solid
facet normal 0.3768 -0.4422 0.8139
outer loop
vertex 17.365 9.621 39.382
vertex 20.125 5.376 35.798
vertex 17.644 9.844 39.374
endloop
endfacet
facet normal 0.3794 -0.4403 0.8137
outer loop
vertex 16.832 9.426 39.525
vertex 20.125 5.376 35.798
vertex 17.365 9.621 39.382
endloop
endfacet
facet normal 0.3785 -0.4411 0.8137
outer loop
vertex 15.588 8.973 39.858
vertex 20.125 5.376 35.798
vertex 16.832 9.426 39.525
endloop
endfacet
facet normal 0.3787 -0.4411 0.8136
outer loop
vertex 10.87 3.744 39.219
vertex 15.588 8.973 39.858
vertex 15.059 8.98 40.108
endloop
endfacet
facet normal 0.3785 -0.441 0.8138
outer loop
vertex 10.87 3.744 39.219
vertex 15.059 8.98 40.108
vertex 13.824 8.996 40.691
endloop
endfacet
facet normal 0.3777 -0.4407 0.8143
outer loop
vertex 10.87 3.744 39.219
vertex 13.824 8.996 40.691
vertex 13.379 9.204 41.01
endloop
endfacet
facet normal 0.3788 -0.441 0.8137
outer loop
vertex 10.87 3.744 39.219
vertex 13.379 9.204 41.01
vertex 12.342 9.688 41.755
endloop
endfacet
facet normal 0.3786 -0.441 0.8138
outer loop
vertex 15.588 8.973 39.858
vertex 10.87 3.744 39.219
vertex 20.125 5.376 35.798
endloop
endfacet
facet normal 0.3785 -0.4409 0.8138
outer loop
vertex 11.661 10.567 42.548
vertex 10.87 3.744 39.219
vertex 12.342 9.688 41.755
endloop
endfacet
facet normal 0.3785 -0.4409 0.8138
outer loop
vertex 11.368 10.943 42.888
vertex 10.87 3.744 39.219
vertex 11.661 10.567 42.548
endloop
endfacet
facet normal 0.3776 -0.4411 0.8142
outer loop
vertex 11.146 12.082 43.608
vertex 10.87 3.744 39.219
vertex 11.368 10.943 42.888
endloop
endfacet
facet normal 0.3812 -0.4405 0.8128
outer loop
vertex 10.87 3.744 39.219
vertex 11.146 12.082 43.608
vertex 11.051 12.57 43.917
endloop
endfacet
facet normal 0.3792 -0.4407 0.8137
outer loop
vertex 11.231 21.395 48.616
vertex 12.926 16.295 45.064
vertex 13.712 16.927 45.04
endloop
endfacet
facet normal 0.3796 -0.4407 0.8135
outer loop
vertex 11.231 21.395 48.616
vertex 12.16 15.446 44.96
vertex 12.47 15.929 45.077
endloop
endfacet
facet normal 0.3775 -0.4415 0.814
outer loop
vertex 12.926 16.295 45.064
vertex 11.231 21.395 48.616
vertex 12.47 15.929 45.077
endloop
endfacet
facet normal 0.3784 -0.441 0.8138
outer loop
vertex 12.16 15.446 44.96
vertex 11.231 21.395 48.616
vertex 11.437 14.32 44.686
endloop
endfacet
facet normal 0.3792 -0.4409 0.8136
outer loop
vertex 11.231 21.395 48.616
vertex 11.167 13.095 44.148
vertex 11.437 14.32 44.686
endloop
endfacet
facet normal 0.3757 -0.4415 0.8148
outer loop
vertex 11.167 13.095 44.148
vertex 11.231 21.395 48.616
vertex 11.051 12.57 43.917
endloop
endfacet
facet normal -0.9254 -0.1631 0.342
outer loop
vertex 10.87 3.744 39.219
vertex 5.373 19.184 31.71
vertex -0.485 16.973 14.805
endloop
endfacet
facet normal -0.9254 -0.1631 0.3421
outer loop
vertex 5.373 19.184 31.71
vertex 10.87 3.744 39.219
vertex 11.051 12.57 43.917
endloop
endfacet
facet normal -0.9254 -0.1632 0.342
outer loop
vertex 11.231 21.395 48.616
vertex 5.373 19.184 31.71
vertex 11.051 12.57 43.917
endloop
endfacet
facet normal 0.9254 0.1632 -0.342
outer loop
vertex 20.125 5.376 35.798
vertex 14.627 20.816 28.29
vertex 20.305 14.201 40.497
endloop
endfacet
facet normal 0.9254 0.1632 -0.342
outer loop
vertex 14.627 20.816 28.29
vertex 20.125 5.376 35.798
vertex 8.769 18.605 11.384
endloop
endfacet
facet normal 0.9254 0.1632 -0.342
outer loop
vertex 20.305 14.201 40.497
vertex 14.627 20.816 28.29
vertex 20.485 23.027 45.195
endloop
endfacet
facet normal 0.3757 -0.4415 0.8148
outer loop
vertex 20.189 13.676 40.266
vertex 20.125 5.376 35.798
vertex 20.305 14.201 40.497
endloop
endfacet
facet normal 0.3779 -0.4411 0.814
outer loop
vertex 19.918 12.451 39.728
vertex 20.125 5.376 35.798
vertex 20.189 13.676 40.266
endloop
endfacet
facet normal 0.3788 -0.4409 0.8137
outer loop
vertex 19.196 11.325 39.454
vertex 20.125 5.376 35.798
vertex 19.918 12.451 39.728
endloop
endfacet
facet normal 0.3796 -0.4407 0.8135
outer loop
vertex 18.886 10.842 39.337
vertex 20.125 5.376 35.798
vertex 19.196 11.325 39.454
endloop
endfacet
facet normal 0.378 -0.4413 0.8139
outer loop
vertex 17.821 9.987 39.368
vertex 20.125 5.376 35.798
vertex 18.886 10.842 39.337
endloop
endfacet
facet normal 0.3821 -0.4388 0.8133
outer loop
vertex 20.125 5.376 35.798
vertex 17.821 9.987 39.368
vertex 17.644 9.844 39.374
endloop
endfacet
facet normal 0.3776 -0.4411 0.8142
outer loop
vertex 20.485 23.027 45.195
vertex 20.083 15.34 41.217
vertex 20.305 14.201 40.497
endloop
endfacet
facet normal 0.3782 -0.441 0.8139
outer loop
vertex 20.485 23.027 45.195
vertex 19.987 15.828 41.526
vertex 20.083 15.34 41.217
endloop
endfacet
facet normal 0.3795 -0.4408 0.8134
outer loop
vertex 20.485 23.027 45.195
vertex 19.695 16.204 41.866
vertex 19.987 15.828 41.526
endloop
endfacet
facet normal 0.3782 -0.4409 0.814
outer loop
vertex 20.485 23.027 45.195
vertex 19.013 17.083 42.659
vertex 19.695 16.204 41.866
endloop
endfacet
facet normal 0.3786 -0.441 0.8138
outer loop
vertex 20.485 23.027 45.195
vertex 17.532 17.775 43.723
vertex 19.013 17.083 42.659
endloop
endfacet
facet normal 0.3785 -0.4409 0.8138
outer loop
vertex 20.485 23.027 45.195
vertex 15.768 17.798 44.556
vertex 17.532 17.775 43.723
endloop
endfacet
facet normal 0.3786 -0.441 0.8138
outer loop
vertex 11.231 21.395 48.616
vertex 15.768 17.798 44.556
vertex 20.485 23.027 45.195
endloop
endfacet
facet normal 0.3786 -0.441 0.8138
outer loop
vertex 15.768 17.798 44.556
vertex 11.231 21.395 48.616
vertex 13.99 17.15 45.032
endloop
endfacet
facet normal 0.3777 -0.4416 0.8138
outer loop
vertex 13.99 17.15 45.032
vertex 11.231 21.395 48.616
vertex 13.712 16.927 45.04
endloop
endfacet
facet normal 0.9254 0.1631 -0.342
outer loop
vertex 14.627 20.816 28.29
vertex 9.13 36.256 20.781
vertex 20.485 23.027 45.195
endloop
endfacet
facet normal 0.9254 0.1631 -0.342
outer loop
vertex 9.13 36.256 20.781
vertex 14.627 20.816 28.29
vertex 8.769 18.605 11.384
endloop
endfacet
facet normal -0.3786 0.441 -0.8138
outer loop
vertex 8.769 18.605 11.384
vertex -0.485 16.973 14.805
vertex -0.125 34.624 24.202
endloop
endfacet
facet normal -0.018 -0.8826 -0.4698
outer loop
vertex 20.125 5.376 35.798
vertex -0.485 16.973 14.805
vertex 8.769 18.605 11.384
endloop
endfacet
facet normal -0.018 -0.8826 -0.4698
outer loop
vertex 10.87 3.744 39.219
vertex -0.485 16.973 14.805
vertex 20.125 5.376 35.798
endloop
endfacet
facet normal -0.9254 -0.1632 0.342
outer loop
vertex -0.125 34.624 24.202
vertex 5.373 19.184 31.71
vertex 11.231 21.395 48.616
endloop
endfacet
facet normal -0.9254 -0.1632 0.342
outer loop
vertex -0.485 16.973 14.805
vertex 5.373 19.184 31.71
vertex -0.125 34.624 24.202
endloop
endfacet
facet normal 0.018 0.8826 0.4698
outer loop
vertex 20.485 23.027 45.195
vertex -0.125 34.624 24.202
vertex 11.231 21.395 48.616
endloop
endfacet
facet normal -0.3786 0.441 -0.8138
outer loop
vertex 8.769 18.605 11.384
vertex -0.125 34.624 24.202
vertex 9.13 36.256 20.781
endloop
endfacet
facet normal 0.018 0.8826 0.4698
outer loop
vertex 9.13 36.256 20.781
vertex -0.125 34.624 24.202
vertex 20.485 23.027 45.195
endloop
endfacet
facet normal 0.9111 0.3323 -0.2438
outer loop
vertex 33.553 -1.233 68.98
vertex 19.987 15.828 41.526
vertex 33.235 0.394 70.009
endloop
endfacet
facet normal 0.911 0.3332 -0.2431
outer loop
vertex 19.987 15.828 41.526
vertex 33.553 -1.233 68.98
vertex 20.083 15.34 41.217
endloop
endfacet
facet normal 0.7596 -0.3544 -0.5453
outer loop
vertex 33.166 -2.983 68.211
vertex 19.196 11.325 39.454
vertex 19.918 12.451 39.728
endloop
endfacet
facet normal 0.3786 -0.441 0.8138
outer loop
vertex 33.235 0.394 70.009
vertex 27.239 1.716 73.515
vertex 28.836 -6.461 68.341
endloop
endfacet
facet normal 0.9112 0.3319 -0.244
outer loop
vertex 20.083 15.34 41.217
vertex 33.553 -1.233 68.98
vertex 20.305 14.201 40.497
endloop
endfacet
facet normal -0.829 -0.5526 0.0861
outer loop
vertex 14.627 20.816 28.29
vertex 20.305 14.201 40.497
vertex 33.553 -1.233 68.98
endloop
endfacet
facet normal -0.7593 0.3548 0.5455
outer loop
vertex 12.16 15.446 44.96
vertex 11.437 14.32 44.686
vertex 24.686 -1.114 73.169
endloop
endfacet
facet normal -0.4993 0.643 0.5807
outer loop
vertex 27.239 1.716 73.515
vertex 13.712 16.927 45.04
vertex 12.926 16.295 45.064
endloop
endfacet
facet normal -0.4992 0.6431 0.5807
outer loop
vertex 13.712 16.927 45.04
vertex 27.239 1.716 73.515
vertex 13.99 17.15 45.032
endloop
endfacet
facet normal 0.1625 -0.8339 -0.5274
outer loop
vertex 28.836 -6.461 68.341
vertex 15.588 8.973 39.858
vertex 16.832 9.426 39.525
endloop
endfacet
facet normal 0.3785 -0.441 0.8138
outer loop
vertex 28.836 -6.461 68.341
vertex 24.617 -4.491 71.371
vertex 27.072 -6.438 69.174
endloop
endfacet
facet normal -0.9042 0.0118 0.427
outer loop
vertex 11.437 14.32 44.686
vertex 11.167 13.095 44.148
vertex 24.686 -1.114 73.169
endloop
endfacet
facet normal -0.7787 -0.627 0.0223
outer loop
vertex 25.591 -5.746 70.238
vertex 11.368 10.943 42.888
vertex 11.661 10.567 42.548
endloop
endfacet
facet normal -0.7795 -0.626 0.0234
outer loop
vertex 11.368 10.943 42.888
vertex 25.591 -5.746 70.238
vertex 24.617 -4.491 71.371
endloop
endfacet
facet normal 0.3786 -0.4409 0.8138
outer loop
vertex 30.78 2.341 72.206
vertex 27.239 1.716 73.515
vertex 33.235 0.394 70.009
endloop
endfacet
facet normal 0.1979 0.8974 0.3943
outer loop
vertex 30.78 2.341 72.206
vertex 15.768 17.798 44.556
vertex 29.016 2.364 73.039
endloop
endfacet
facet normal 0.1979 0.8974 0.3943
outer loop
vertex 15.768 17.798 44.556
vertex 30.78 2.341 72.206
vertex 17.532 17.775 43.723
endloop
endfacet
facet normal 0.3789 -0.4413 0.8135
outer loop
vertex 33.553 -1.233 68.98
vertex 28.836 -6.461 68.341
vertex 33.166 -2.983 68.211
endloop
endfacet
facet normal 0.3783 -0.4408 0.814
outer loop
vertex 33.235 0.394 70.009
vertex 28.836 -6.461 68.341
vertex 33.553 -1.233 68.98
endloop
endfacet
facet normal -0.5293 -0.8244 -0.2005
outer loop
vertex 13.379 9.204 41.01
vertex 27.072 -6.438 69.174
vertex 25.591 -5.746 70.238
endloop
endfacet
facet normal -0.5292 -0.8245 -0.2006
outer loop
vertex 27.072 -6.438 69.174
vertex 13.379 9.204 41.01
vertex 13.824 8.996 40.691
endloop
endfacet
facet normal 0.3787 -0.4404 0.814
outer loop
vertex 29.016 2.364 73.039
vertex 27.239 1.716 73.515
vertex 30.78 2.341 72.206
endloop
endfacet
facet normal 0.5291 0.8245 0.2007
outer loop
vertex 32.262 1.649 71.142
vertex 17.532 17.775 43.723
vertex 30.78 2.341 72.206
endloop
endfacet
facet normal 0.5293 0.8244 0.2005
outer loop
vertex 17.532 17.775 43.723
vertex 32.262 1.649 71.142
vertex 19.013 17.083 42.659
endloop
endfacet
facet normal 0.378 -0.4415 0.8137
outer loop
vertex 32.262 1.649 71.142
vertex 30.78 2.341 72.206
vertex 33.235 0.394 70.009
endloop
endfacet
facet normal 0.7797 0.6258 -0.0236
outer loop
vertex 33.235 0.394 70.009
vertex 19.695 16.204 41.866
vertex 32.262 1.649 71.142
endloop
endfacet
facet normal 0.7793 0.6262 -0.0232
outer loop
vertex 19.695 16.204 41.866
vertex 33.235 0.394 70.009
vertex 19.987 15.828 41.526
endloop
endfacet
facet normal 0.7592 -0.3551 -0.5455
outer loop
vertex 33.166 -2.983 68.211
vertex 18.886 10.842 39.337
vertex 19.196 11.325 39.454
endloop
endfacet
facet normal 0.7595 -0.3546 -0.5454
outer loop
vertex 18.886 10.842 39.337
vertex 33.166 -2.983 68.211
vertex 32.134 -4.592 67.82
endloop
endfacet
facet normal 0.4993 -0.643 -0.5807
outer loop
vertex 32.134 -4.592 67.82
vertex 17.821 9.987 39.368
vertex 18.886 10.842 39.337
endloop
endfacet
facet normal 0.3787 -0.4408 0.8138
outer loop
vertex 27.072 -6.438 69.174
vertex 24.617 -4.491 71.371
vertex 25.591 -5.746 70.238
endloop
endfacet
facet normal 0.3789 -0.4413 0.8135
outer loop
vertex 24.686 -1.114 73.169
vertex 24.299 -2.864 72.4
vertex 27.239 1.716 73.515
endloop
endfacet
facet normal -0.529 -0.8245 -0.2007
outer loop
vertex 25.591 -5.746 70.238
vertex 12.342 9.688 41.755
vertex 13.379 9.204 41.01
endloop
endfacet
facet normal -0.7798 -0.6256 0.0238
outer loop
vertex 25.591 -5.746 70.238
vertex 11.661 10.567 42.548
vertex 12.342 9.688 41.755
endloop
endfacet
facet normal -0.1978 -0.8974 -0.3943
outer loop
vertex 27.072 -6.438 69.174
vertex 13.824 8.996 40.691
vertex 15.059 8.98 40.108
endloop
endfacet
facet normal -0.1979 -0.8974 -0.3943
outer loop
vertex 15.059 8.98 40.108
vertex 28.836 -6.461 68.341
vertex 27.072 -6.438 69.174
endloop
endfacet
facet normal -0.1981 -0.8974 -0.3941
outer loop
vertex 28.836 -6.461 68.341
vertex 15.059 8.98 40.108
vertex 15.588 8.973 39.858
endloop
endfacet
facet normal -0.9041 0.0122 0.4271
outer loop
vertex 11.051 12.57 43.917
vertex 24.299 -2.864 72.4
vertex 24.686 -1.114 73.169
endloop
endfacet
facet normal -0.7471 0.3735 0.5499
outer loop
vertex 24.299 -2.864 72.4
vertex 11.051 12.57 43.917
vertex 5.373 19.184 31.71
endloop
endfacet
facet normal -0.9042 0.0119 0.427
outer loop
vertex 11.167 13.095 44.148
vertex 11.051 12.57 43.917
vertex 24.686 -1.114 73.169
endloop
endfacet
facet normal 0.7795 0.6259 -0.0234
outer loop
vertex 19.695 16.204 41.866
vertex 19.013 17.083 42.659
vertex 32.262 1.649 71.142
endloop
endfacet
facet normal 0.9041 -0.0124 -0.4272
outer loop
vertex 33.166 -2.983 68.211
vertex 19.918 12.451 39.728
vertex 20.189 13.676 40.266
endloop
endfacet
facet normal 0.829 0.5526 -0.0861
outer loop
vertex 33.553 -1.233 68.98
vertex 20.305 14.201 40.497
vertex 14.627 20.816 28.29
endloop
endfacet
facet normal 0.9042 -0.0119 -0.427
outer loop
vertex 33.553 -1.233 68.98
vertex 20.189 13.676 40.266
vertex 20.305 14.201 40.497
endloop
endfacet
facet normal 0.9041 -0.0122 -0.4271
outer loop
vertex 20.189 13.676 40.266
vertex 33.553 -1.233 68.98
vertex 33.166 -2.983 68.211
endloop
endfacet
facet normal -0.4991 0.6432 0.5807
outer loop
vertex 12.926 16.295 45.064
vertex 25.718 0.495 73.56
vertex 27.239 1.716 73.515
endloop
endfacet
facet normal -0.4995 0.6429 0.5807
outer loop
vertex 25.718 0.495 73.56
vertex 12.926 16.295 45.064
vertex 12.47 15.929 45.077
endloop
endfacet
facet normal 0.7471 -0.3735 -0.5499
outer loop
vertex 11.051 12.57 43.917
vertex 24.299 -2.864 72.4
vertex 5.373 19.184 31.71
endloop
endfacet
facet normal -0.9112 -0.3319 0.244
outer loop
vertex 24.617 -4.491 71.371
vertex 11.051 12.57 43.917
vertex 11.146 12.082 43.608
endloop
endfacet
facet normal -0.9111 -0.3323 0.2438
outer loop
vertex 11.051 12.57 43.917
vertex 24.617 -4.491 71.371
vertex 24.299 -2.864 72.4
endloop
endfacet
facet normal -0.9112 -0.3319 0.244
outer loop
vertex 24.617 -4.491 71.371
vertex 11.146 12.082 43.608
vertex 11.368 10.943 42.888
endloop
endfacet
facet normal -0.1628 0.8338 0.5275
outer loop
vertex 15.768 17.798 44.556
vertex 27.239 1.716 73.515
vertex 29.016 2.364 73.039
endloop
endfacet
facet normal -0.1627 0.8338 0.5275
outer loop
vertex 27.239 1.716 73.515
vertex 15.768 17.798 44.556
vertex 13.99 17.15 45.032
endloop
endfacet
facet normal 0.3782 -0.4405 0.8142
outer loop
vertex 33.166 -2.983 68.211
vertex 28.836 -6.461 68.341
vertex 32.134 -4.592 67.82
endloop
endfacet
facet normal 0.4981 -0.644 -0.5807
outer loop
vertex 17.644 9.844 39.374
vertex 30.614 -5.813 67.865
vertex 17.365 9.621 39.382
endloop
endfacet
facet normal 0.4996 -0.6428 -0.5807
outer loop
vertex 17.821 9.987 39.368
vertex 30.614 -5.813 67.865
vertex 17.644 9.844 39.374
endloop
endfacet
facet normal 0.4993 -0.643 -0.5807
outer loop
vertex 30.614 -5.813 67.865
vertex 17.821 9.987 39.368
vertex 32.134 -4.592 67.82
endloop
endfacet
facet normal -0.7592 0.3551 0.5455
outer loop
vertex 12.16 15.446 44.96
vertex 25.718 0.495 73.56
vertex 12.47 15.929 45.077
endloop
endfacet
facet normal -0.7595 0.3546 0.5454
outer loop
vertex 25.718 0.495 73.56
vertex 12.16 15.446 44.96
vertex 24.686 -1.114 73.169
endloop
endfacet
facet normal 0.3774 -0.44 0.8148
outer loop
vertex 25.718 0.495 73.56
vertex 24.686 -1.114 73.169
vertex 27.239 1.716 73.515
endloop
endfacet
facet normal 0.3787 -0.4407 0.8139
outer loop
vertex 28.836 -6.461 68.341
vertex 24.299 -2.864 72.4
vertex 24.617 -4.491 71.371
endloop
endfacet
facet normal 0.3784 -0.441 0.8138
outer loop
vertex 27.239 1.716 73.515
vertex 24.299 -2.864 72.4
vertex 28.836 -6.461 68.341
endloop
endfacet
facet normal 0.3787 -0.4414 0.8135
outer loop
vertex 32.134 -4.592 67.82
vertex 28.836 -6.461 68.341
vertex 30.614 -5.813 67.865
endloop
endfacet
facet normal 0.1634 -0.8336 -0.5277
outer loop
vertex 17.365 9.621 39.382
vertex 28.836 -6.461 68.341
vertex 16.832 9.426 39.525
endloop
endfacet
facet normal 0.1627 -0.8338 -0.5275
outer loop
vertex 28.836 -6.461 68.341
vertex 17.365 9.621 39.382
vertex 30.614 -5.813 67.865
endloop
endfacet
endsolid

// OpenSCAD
module testch(){
    translate([10, 20, 30]){
        rotate([30,20,10]){
            children();
        }
    }
}



testch(){
    cube([10,20,30],center=true);
}



testch(){
    cylinder(h=50,r=5);
}
